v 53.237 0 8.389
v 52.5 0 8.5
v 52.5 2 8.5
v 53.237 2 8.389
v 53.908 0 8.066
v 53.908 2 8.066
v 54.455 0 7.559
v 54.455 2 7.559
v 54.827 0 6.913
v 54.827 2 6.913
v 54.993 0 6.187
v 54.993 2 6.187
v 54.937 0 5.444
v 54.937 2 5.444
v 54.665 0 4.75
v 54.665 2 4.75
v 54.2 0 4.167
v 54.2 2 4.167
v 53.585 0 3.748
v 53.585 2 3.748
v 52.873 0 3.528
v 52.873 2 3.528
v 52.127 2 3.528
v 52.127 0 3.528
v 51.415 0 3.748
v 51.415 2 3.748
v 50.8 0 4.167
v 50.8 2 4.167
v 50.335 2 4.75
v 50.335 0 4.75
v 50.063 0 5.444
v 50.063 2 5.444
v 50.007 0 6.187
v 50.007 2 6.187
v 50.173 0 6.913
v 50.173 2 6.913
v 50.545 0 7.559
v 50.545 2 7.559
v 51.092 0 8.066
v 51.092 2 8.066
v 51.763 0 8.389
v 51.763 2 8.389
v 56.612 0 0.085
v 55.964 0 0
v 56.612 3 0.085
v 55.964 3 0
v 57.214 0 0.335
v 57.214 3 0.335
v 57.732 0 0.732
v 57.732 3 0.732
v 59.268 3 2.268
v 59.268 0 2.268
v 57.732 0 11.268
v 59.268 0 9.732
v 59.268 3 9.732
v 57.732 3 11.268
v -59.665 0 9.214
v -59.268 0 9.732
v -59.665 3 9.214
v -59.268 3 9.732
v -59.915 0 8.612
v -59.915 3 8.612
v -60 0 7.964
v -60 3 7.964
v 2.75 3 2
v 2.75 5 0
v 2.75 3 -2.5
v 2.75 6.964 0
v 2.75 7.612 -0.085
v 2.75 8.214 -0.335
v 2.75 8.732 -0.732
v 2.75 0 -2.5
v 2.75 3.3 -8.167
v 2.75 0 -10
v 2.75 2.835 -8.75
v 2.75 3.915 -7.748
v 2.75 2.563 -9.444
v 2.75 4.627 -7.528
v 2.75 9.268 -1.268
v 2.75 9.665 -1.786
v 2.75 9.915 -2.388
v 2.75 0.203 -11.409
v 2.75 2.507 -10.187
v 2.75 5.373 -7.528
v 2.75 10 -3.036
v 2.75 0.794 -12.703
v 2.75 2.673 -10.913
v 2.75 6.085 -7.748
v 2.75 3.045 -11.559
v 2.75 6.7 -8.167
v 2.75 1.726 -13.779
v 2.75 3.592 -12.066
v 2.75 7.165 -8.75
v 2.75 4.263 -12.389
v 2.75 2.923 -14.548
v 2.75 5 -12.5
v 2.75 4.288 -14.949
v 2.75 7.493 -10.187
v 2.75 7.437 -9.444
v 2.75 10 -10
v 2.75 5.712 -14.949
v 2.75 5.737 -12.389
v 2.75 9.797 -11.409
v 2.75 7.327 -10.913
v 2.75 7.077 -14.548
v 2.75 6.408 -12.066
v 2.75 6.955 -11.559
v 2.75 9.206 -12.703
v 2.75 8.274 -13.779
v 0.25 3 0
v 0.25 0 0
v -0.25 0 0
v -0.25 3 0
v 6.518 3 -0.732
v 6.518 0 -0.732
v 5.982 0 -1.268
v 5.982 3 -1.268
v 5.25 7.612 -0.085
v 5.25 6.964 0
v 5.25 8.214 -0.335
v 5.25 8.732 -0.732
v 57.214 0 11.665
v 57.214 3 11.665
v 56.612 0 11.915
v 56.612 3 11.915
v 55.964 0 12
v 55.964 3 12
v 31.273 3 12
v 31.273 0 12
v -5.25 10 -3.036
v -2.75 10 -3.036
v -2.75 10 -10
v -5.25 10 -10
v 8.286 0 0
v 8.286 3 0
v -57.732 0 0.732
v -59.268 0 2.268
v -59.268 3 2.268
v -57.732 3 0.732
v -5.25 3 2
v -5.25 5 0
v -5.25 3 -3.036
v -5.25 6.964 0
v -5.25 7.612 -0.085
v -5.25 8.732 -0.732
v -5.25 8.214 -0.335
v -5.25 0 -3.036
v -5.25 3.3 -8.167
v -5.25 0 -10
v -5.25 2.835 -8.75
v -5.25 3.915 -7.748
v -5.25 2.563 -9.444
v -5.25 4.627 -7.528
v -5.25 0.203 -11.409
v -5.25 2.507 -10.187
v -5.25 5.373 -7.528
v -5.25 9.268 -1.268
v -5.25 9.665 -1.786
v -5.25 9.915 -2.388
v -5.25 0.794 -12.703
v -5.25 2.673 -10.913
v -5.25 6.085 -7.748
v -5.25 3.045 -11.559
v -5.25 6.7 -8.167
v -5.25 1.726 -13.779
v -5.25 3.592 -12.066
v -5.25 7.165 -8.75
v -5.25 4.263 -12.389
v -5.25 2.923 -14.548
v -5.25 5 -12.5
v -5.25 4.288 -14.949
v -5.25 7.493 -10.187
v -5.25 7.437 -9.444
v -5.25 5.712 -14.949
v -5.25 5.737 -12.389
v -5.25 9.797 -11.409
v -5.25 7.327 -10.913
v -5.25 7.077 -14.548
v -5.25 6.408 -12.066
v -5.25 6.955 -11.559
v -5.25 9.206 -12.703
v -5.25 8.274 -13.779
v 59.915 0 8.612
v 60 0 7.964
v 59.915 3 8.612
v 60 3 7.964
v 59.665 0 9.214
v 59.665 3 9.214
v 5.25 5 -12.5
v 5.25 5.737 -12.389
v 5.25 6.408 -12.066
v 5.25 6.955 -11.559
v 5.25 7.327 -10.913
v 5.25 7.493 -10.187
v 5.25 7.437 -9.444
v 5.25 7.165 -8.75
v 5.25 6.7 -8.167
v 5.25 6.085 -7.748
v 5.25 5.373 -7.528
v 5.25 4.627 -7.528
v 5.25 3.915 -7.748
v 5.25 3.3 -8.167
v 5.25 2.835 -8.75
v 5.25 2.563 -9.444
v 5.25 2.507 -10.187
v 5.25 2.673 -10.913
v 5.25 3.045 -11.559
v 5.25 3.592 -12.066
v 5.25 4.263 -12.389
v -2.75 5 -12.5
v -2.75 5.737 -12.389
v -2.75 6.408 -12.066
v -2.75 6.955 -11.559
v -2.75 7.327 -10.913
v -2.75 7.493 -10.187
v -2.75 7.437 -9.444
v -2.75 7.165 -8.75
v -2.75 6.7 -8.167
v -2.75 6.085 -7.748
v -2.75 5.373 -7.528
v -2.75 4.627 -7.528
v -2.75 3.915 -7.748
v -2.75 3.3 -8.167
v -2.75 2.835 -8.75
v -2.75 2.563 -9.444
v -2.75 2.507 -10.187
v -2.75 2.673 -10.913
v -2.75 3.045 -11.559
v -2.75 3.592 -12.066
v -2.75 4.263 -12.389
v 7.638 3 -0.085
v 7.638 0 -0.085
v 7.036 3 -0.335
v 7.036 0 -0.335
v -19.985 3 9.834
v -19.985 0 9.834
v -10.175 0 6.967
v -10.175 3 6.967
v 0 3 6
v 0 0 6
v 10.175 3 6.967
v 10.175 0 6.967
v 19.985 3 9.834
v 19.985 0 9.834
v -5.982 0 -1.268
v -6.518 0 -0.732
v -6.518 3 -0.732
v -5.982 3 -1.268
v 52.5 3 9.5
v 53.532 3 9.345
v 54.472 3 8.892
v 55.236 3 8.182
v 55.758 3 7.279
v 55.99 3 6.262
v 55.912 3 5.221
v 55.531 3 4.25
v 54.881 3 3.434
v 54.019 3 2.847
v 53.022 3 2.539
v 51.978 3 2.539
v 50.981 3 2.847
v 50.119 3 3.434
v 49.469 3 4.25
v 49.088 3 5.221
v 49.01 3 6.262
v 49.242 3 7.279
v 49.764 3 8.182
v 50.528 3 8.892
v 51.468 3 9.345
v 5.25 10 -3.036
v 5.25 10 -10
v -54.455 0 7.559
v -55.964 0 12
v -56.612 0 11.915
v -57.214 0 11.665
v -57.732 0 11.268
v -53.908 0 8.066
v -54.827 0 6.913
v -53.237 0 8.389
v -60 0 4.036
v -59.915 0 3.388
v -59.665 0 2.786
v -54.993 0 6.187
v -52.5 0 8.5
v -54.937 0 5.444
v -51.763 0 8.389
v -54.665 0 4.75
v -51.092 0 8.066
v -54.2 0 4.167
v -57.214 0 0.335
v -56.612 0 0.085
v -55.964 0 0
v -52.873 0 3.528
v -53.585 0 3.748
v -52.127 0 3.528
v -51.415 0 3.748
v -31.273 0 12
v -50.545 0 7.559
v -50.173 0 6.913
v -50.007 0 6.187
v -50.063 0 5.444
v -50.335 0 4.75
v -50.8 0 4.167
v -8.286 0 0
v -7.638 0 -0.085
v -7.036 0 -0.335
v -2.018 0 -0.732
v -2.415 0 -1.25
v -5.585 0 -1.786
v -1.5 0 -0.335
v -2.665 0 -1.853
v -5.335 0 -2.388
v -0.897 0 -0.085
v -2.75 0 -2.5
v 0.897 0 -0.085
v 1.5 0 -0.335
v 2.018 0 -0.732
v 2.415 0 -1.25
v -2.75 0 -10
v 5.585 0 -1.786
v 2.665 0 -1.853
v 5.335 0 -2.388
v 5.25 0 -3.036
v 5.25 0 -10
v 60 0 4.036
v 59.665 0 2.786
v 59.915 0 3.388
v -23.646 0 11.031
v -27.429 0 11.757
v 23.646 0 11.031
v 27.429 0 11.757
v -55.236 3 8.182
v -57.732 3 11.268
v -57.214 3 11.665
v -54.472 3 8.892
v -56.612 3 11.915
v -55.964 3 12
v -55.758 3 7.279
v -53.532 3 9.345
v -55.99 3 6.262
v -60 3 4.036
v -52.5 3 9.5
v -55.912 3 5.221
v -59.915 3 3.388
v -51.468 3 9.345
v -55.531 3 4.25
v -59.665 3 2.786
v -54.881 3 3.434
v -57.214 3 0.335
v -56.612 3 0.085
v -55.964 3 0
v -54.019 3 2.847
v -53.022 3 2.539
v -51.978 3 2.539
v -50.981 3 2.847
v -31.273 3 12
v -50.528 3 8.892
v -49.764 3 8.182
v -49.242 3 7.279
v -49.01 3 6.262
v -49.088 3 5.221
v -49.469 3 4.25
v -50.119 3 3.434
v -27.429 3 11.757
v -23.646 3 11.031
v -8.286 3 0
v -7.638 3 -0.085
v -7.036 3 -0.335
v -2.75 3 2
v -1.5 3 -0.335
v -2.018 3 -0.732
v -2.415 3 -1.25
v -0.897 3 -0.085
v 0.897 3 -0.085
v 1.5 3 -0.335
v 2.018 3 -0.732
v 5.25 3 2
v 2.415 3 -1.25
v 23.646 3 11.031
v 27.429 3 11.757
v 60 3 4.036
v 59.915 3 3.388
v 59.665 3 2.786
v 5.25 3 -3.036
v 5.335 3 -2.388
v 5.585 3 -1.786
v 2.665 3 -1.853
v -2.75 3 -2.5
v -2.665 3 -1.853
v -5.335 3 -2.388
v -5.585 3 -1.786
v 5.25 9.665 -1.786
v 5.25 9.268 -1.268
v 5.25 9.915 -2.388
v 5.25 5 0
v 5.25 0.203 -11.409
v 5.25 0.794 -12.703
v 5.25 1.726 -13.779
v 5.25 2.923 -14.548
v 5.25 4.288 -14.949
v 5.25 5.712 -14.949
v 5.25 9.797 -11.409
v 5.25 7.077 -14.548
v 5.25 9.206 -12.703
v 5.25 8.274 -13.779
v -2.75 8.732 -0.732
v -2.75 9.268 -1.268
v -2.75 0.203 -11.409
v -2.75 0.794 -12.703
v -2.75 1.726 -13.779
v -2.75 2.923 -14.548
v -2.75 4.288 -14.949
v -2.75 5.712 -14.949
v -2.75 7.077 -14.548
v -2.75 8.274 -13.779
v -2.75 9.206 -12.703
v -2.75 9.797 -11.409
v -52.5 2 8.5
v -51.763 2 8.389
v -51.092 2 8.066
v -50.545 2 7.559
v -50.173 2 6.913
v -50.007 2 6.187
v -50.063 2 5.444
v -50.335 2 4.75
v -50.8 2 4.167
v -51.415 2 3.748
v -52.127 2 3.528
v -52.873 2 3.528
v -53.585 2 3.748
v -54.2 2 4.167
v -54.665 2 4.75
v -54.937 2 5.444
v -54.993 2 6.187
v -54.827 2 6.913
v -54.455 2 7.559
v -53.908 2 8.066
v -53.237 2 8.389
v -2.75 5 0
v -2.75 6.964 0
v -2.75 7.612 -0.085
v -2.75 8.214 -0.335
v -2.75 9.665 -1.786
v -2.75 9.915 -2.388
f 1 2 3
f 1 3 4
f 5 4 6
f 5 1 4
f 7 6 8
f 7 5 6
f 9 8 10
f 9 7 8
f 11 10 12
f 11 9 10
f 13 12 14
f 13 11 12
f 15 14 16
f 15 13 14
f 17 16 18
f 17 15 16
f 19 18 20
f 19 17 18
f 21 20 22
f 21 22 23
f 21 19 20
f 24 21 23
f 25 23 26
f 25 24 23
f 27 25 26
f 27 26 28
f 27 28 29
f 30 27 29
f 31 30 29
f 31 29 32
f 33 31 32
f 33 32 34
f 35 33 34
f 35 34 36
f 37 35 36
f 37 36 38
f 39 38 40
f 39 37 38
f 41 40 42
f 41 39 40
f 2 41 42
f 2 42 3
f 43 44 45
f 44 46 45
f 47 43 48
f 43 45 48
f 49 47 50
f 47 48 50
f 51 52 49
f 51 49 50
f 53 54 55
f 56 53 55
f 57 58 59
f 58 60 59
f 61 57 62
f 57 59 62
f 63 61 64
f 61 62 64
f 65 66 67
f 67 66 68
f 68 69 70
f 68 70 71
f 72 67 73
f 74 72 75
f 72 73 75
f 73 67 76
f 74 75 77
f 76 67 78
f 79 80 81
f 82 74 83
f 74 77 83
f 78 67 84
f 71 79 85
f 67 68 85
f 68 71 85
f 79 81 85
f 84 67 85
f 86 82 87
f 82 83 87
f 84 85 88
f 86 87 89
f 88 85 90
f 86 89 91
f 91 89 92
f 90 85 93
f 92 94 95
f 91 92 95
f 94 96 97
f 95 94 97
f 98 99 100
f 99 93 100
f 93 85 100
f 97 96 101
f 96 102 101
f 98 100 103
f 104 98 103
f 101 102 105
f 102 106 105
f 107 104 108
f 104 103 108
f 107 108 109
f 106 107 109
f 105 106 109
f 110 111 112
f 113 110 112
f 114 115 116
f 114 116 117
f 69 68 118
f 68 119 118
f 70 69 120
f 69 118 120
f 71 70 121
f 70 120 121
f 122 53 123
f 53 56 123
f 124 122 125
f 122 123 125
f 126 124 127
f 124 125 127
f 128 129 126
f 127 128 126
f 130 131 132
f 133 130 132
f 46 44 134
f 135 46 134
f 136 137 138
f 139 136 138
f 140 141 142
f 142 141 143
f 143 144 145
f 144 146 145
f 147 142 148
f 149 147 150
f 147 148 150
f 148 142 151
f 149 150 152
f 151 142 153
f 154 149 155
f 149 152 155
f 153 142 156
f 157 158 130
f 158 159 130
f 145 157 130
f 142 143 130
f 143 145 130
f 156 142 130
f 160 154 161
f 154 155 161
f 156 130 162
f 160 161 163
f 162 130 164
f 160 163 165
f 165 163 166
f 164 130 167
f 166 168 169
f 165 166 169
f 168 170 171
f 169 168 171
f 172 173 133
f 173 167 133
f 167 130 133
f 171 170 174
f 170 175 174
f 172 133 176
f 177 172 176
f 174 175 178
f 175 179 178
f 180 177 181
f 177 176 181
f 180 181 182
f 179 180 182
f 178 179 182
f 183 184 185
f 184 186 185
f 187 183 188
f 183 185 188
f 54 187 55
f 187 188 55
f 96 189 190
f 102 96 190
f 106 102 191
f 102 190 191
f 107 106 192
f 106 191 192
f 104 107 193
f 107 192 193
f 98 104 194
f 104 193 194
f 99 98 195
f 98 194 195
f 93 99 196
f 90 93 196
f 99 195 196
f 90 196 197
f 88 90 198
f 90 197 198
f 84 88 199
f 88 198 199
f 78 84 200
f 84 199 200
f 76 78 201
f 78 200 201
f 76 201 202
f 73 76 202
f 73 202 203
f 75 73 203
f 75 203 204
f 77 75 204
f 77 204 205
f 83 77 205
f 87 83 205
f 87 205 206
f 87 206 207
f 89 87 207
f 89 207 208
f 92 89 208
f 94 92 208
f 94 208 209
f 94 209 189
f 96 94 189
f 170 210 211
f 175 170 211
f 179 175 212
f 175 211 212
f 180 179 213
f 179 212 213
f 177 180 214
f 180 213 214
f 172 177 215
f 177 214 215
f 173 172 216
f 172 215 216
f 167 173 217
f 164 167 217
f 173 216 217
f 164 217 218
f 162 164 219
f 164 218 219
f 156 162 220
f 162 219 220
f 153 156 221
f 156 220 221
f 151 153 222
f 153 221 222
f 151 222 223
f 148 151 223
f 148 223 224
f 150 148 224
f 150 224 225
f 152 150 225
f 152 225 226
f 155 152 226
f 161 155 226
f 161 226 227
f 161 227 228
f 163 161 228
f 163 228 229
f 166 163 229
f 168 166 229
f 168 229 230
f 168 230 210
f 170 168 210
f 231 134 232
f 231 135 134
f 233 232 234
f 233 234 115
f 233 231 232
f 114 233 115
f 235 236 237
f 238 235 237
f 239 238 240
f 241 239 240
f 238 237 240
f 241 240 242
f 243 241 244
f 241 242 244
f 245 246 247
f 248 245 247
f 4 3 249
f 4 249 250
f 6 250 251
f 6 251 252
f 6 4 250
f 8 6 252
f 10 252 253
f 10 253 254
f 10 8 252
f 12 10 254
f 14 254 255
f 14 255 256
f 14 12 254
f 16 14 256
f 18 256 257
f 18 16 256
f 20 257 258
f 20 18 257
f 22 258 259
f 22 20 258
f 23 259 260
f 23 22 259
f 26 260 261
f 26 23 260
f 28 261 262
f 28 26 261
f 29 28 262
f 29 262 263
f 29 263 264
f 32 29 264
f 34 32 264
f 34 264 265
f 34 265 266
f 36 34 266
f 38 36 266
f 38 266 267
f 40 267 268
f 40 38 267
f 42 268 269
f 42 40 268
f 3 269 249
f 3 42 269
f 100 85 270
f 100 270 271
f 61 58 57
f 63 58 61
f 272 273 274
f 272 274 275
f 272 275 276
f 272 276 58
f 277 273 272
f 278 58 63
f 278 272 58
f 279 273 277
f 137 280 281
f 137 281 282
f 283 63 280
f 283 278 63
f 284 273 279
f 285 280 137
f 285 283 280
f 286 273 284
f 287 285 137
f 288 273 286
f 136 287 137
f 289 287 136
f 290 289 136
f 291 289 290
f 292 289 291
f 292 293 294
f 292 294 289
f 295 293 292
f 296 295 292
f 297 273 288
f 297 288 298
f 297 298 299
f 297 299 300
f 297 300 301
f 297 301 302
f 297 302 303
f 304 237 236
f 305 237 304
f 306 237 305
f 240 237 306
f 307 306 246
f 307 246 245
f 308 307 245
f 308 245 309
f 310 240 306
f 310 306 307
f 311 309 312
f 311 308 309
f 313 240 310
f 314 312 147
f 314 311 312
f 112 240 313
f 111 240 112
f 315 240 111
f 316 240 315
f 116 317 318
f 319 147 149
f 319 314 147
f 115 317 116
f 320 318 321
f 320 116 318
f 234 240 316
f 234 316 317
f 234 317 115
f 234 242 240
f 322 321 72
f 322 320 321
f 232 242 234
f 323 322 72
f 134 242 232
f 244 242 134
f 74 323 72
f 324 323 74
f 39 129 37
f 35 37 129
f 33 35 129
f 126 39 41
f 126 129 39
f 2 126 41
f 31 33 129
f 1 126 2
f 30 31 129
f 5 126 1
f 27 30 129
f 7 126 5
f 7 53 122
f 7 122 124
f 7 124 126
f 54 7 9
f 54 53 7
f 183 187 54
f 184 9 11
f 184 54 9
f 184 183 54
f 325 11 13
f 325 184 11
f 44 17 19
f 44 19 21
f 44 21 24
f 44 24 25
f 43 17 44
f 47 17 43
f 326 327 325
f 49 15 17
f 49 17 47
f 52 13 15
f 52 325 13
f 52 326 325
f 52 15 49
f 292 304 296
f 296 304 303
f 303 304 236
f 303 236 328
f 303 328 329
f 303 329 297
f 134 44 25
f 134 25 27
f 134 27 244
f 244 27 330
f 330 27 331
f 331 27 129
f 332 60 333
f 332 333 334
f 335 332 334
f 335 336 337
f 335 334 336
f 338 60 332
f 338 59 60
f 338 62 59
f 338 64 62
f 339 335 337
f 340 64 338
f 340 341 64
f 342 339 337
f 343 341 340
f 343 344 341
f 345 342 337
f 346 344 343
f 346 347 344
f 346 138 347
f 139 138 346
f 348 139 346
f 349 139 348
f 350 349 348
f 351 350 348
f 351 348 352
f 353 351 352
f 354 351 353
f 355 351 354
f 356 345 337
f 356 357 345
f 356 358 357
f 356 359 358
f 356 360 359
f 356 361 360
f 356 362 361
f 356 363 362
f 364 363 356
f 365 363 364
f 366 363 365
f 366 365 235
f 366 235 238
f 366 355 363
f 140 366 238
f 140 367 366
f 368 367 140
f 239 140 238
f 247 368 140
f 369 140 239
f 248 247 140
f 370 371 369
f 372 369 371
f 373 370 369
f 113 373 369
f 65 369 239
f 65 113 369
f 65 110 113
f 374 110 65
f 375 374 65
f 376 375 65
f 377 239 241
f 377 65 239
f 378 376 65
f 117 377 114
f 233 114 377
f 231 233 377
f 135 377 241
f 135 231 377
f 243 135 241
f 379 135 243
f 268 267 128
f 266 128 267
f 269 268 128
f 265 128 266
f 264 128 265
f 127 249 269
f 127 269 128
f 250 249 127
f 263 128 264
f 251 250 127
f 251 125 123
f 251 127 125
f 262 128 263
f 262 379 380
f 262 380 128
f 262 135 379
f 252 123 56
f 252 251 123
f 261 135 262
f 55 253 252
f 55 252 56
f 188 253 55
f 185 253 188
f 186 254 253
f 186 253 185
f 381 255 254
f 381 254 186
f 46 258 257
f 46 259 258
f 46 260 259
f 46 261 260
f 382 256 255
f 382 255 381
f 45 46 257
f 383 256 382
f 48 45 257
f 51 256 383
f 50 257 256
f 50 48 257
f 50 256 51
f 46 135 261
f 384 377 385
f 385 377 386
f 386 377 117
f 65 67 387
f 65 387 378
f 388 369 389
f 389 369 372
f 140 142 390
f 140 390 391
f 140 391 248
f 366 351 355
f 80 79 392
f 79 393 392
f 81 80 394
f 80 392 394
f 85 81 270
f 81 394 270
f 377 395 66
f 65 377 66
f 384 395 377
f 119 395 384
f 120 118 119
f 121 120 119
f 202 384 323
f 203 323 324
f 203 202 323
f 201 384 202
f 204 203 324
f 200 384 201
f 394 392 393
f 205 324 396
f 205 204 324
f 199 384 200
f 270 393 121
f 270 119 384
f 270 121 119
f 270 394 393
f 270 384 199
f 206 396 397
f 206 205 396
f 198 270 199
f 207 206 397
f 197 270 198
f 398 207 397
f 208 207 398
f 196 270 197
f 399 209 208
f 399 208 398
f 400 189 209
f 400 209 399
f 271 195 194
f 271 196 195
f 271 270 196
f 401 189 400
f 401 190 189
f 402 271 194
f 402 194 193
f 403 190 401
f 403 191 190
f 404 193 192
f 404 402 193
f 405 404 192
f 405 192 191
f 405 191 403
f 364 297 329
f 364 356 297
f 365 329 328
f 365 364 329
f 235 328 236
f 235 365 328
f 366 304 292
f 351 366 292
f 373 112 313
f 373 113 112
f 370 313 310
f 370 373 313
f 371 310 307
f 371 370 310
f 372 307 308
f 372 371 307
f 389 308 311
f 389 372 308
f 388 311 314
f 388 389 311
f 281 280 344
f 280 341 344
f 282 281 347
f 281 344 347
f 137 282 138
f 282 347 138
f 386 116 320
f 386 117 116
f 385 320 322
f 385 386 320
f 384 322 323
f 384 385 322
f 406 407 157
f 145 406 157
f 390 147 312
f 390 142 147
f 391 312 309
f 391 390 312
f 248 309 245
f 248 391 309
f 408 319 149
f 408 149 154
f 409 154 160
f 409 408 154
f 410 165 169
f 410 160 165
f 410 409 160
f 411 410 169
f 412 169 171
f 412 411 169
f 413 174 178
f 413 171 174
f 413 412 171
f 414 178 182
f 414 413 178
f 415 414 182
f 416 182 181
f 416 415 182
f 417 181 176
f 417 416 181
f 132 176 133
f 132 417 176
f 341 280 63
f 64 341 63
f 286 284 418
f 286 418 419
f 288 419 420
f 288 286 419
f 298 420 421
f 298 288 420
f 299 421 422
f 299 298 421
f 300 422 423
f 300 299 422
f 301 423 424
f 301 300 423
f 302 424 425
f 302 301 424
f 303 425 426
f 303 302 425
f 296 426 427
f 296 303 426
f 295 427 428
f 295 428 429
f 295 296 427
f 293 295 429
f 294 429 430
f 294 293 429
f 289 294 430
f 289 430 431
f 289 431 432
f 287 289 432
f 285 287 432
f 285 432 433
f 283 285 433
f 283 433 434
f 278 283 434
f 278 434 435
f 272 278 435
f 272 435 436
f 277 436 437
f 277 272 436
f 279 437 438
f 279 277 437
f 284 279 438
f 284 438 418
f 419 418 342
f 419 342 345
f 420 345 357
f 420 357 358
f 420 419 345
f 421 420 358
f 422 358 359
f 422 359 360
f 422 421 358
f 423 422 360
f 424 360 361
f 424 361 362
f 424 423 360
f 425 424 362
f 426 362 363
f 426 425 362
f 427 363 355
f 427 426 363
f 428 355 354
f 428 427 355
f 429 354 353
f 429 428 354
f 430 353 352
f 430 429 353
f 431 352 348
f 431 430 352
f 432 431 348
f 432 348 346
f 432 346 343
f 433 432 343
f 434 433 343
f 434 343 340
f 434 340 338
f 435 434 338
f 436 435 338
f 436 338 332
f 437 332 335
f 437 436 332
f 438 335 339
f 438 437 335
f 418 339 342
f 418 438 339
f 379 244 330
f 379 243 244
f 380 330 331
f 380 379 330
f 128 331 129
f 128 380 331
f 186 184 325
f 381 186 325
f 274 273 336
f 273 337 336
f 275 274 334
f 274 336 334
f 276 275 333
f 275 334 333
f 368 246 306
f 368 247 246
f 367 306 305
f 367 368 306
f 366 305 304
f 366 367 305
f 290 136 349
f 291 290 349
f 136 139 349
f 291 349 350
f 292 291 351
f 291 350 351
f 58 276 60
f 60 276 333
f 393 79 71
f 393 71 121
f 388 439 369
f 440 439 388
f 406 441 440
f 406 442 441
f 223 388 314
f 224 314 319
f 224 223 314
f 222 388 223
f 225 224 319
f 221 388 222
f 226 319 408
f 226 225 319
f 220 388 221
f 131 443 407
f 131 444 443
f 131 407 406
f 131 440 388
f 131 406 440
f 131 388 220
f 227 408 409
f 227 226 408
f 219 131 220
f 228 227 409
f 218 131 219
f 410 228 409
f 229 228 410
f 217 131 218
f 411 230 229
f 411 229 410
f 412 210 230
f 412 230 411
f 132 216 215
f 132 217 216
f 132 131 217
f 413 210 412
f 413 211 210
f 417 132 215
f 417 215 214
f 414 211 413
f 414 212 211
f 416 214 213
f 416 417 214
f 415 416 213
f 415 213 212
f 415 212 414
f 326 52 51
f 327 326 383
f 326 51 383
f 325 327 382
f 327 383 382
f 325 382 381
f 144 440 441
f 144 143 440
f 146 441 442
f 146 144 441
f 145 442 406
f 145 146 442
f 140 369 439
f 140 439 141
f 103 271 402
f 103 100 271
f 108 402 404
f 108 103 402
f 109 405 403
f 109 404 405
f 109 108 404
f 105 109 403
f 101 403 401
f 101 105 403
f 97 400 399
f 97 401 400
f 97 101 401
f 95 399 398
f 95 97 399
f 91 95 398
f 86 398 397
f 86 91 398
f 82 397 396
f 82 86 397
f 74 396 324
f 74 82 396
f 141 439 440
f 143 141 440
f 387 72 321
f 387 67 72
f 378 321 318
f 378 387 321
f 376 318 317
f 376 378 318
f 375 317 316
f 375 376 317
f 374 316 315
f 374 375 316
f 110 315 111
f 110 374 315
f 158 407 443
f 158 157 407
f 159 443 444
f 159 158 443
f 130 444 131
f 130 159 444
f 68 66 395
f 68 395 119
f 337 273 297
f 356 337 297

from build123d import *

# Parameters (mm, degrees)
SKETCH2_R                   = 2.5
BOSS_EXTRUDE1_DEPTH         = 3
BOSS_EXTRUDE2_START         = 2.75
SKETCH3_W                   = 15
SKETCH3_H                   = 10
BOSS_EXTRUDE2_DEPTH         = 2.5
FILLET2_RADIUS              = 5
FILLET2_LENGTH              = 2.5
FILLET2_OF_MIRROR1_2_RADIUS = 5
FILLET2_OF_MIRROR1_2_LENGTH = 2.5
CHAMFER1_SIZE               = 2
CHAMFER2_SIZE               = 2
SKETCH5_R                   = 2.5
CUT_EXTRUDE2_DEPTH          = 68.694626818
CHAMFER3_SIZE               = 3
FILLET3_R                   = 2.5
CHAMFER4_SIZE               = 1
FILLET4_R                   = 30.5


with BuildPart() as part:
    # Sketch2 → Boss-Extrude1 (new body)
    with BuildSketch(Plane(origin=(0, 0, 0), x_dir=(1, 0, 0), z_dir=(0, 1, 0))):
        with BuildLine():
            Line((60, 0), (-60, 0))
            Line((-60, 0), (-60, -12))
            Line((-60, -12), (-24.738633754, -12))
            ThreePointArc((-24.738633754, -12), (0, -6), (24.738633754, -12))
            Line((24.738633754, -12), (60, -12))
            Line((60, -12), (60, 0))
        make_face()
        with Locations(Location((-52.5, -6, 0), (0, 0, 270))):
            Circle(SKETCH2_R, mode=Mode.SUBTRACT)
        with Locations(Location((52.5, -6, 0), (0, 0, 270))):
            Circle(SKETCH2_R, mode=Mode.SUBTRACT)
    extrude(amount=BOSS_EXTRUDE1_DEPTH)

    # Sketch3 → Boss-Extrude2 (add)
    with BuildSketch(Plane(origin=(0, 0, 0), x_dir=(0, 0, -1), z_dir=(1, 0, 0)).offset(BOSS_EXTRUDE2_START)):
        with Locations((7.5, 5)):
            Rectangle(SKETCH3_W, SKETCH3_H)
    boss_extrude2 = extrude(amount=BOSS_EXTRUDE2_DEPTH)

    # Fillet2: full round fillet: the end face becomes a half cylinder, R = half its width
    fillet2_face = Plane((4, 5, -15), x_dir=(-1, 0, 0), z_dir=(0, 0, -1))  # on the end face: x along it, z out of the body
    fillet2_slab = fillet2_face.offset(-FILLET2_RADIUS / 2) * Box(FILLET2_LENGTH, 2 * FILLET2_RADIUS, FILLET2_RADIUS, mode=Mode.PRIVATE)  # the body's end, R deep
    fillet2_round = Plane((4, 5, -10), x_dir=(0, 0, -1), z_dir=(-1, 0, 0)) * Cylinder(FILLET2_RADIUS, FILLET2_LENGTH, mode=Mode.PRIVATE)  # its axis R under the face
    add(fillet2_slab - fillet2_round, mode=Mode.SUBTRACT)

    # Mirror1: Boss-Extrude2 across plane
    add(boss_extrude2.mirror(Plane(origin=(0, 0, 0), x_dir=(0, 0, 1), z_dir=(1, 0, 0))))

    # Fillet2 of Mirror1 2: full round fillet: the end face becomes a half cylinder, R = half its width
    fillet2_of_mirror1_2_face = Plane((-4, 5, -15), x_dir=(1, 0, 0), z_dir=(0, 0, -1))  # on the end face: x along it, z out of the body
    fillet2_of_mirror1_2_slab = fillet2_of_mirror1_2_face.offset(-FILLET2_OF_MIRROR1_2_RADIUS / 2) * Box(FILLET2_OF_MIRROR1_2_LENGTH, 2 * FILLET2_OF_MIRROR1_2_RADIUS, FILLET2_OF_MIRROR1_2_RADIUS, mode=Mode.PRIVATE)  # the body's end, R deep
    fillet2_of_mirror1_2_round = Plane((-4, 5, -10), x_dir=(0, 0, -1), z_dir=(1, 0, 0)) * Cylinder(FILLET2_OF_MIRROR1_2_RADIUS, FILLET2_OF_MIRROR1_2_LENGTH, mode=Mode.PRIVATE)  # its axis R under the face
    add(fillet2_of_mirror1_2_slab - fillet2_of_mirror1_2_round, mode=Mode.SUBTRACT)

    # Chamfer1
    chamfer1_edges = [part.edges().sort_by_distance(p)[0] for p in [
        (4, 3, 0),
        (-4, 3, 0),
    ]]
    chamfer(chamfer1_edges, length=CHAMFER1_SIZE)

    # Chamfer2
    chamfer2_edges = [part.edges().sort_by_distance(p)[0] for p in [
        (-5.25, 1.5, 0),
        (5.25, 1.5, 0),
        (4, 10, 0),
        (-4, 10, 0),
    ]]
    chamfer(chamfer2_edges, length=CHAMFER2_SIZE)

    # Sketch5 → Cut-Extrude2 (cut, through all)
    with BuildSketch(Plane(origin=(5.25, 0, 0), x_dir=(0, 0, -1), z_dir=(1, 0, 0))):
        with Locations((10, 5)):
            Circle(SKETCH5_R)
    extrude(amount=-CUT_EXTRUDE2_DEPTH, mode=Mode.SUBTRACT)

    # Chamfer3
    chamfer3_edges = [part.edges().sort_by_distance(p)[0] for p in [
        (-60, 1.5, 12),
        (-60, 1.5, 0),
        (60, 1.5, 0),
        (60, 1.5, 12),
    ]]
    chamfer(chamfer3_edges, length=CHAMFER3_SIZE)

    # Fillet3
    fillet3_edges = [part.edges().sort_by_distance(p)[0] for p in [
        (-57, 1.5, 0),
        (-7.25, 1.5, 0),
        (-5.25, 1.5, -2),
        (-2.75, 1.5, 0),
        (2.75, 1.5, 0),
        (5.25, 1.5, -2),
        (7.25, 1.5, 0),
        (57, 1.5, 0),
        (60, 1.5, 3),
        (60, 1.5, 9),
        (57, 1.5, 12),
        (-60, 1.5, 3),
        (4, 8, 0),
        (4, 10, -2),
        (-4, 10, -2),
        (-4, 8, 0),
        (-60, 1.5, 9),
        (-57, 1.5, 12),
    ]]
    fillet(fillet3_edges, radius=FILLET3_R)

    # Chamfer4
    chamfer4_edges = [part.edges().sort_by_distance(p)[0] for p in [
        (-52.5, 3, 3.5),
        (52.5, 3, 3.5),
    ]]
    chamfer(chamfer4_edges, length=CHAMFER4_SIZE)

    # Fillet4
    fillet4_edges = [part.edges().sort_by_distance(p)[0] for p in [
        (-24.738633754, 1.5, 12),
        (24.738633754, 1.5, 12),
    ]]
    fillet(fillet4_edges, radius=FILLET4_R)


solid = part.part
